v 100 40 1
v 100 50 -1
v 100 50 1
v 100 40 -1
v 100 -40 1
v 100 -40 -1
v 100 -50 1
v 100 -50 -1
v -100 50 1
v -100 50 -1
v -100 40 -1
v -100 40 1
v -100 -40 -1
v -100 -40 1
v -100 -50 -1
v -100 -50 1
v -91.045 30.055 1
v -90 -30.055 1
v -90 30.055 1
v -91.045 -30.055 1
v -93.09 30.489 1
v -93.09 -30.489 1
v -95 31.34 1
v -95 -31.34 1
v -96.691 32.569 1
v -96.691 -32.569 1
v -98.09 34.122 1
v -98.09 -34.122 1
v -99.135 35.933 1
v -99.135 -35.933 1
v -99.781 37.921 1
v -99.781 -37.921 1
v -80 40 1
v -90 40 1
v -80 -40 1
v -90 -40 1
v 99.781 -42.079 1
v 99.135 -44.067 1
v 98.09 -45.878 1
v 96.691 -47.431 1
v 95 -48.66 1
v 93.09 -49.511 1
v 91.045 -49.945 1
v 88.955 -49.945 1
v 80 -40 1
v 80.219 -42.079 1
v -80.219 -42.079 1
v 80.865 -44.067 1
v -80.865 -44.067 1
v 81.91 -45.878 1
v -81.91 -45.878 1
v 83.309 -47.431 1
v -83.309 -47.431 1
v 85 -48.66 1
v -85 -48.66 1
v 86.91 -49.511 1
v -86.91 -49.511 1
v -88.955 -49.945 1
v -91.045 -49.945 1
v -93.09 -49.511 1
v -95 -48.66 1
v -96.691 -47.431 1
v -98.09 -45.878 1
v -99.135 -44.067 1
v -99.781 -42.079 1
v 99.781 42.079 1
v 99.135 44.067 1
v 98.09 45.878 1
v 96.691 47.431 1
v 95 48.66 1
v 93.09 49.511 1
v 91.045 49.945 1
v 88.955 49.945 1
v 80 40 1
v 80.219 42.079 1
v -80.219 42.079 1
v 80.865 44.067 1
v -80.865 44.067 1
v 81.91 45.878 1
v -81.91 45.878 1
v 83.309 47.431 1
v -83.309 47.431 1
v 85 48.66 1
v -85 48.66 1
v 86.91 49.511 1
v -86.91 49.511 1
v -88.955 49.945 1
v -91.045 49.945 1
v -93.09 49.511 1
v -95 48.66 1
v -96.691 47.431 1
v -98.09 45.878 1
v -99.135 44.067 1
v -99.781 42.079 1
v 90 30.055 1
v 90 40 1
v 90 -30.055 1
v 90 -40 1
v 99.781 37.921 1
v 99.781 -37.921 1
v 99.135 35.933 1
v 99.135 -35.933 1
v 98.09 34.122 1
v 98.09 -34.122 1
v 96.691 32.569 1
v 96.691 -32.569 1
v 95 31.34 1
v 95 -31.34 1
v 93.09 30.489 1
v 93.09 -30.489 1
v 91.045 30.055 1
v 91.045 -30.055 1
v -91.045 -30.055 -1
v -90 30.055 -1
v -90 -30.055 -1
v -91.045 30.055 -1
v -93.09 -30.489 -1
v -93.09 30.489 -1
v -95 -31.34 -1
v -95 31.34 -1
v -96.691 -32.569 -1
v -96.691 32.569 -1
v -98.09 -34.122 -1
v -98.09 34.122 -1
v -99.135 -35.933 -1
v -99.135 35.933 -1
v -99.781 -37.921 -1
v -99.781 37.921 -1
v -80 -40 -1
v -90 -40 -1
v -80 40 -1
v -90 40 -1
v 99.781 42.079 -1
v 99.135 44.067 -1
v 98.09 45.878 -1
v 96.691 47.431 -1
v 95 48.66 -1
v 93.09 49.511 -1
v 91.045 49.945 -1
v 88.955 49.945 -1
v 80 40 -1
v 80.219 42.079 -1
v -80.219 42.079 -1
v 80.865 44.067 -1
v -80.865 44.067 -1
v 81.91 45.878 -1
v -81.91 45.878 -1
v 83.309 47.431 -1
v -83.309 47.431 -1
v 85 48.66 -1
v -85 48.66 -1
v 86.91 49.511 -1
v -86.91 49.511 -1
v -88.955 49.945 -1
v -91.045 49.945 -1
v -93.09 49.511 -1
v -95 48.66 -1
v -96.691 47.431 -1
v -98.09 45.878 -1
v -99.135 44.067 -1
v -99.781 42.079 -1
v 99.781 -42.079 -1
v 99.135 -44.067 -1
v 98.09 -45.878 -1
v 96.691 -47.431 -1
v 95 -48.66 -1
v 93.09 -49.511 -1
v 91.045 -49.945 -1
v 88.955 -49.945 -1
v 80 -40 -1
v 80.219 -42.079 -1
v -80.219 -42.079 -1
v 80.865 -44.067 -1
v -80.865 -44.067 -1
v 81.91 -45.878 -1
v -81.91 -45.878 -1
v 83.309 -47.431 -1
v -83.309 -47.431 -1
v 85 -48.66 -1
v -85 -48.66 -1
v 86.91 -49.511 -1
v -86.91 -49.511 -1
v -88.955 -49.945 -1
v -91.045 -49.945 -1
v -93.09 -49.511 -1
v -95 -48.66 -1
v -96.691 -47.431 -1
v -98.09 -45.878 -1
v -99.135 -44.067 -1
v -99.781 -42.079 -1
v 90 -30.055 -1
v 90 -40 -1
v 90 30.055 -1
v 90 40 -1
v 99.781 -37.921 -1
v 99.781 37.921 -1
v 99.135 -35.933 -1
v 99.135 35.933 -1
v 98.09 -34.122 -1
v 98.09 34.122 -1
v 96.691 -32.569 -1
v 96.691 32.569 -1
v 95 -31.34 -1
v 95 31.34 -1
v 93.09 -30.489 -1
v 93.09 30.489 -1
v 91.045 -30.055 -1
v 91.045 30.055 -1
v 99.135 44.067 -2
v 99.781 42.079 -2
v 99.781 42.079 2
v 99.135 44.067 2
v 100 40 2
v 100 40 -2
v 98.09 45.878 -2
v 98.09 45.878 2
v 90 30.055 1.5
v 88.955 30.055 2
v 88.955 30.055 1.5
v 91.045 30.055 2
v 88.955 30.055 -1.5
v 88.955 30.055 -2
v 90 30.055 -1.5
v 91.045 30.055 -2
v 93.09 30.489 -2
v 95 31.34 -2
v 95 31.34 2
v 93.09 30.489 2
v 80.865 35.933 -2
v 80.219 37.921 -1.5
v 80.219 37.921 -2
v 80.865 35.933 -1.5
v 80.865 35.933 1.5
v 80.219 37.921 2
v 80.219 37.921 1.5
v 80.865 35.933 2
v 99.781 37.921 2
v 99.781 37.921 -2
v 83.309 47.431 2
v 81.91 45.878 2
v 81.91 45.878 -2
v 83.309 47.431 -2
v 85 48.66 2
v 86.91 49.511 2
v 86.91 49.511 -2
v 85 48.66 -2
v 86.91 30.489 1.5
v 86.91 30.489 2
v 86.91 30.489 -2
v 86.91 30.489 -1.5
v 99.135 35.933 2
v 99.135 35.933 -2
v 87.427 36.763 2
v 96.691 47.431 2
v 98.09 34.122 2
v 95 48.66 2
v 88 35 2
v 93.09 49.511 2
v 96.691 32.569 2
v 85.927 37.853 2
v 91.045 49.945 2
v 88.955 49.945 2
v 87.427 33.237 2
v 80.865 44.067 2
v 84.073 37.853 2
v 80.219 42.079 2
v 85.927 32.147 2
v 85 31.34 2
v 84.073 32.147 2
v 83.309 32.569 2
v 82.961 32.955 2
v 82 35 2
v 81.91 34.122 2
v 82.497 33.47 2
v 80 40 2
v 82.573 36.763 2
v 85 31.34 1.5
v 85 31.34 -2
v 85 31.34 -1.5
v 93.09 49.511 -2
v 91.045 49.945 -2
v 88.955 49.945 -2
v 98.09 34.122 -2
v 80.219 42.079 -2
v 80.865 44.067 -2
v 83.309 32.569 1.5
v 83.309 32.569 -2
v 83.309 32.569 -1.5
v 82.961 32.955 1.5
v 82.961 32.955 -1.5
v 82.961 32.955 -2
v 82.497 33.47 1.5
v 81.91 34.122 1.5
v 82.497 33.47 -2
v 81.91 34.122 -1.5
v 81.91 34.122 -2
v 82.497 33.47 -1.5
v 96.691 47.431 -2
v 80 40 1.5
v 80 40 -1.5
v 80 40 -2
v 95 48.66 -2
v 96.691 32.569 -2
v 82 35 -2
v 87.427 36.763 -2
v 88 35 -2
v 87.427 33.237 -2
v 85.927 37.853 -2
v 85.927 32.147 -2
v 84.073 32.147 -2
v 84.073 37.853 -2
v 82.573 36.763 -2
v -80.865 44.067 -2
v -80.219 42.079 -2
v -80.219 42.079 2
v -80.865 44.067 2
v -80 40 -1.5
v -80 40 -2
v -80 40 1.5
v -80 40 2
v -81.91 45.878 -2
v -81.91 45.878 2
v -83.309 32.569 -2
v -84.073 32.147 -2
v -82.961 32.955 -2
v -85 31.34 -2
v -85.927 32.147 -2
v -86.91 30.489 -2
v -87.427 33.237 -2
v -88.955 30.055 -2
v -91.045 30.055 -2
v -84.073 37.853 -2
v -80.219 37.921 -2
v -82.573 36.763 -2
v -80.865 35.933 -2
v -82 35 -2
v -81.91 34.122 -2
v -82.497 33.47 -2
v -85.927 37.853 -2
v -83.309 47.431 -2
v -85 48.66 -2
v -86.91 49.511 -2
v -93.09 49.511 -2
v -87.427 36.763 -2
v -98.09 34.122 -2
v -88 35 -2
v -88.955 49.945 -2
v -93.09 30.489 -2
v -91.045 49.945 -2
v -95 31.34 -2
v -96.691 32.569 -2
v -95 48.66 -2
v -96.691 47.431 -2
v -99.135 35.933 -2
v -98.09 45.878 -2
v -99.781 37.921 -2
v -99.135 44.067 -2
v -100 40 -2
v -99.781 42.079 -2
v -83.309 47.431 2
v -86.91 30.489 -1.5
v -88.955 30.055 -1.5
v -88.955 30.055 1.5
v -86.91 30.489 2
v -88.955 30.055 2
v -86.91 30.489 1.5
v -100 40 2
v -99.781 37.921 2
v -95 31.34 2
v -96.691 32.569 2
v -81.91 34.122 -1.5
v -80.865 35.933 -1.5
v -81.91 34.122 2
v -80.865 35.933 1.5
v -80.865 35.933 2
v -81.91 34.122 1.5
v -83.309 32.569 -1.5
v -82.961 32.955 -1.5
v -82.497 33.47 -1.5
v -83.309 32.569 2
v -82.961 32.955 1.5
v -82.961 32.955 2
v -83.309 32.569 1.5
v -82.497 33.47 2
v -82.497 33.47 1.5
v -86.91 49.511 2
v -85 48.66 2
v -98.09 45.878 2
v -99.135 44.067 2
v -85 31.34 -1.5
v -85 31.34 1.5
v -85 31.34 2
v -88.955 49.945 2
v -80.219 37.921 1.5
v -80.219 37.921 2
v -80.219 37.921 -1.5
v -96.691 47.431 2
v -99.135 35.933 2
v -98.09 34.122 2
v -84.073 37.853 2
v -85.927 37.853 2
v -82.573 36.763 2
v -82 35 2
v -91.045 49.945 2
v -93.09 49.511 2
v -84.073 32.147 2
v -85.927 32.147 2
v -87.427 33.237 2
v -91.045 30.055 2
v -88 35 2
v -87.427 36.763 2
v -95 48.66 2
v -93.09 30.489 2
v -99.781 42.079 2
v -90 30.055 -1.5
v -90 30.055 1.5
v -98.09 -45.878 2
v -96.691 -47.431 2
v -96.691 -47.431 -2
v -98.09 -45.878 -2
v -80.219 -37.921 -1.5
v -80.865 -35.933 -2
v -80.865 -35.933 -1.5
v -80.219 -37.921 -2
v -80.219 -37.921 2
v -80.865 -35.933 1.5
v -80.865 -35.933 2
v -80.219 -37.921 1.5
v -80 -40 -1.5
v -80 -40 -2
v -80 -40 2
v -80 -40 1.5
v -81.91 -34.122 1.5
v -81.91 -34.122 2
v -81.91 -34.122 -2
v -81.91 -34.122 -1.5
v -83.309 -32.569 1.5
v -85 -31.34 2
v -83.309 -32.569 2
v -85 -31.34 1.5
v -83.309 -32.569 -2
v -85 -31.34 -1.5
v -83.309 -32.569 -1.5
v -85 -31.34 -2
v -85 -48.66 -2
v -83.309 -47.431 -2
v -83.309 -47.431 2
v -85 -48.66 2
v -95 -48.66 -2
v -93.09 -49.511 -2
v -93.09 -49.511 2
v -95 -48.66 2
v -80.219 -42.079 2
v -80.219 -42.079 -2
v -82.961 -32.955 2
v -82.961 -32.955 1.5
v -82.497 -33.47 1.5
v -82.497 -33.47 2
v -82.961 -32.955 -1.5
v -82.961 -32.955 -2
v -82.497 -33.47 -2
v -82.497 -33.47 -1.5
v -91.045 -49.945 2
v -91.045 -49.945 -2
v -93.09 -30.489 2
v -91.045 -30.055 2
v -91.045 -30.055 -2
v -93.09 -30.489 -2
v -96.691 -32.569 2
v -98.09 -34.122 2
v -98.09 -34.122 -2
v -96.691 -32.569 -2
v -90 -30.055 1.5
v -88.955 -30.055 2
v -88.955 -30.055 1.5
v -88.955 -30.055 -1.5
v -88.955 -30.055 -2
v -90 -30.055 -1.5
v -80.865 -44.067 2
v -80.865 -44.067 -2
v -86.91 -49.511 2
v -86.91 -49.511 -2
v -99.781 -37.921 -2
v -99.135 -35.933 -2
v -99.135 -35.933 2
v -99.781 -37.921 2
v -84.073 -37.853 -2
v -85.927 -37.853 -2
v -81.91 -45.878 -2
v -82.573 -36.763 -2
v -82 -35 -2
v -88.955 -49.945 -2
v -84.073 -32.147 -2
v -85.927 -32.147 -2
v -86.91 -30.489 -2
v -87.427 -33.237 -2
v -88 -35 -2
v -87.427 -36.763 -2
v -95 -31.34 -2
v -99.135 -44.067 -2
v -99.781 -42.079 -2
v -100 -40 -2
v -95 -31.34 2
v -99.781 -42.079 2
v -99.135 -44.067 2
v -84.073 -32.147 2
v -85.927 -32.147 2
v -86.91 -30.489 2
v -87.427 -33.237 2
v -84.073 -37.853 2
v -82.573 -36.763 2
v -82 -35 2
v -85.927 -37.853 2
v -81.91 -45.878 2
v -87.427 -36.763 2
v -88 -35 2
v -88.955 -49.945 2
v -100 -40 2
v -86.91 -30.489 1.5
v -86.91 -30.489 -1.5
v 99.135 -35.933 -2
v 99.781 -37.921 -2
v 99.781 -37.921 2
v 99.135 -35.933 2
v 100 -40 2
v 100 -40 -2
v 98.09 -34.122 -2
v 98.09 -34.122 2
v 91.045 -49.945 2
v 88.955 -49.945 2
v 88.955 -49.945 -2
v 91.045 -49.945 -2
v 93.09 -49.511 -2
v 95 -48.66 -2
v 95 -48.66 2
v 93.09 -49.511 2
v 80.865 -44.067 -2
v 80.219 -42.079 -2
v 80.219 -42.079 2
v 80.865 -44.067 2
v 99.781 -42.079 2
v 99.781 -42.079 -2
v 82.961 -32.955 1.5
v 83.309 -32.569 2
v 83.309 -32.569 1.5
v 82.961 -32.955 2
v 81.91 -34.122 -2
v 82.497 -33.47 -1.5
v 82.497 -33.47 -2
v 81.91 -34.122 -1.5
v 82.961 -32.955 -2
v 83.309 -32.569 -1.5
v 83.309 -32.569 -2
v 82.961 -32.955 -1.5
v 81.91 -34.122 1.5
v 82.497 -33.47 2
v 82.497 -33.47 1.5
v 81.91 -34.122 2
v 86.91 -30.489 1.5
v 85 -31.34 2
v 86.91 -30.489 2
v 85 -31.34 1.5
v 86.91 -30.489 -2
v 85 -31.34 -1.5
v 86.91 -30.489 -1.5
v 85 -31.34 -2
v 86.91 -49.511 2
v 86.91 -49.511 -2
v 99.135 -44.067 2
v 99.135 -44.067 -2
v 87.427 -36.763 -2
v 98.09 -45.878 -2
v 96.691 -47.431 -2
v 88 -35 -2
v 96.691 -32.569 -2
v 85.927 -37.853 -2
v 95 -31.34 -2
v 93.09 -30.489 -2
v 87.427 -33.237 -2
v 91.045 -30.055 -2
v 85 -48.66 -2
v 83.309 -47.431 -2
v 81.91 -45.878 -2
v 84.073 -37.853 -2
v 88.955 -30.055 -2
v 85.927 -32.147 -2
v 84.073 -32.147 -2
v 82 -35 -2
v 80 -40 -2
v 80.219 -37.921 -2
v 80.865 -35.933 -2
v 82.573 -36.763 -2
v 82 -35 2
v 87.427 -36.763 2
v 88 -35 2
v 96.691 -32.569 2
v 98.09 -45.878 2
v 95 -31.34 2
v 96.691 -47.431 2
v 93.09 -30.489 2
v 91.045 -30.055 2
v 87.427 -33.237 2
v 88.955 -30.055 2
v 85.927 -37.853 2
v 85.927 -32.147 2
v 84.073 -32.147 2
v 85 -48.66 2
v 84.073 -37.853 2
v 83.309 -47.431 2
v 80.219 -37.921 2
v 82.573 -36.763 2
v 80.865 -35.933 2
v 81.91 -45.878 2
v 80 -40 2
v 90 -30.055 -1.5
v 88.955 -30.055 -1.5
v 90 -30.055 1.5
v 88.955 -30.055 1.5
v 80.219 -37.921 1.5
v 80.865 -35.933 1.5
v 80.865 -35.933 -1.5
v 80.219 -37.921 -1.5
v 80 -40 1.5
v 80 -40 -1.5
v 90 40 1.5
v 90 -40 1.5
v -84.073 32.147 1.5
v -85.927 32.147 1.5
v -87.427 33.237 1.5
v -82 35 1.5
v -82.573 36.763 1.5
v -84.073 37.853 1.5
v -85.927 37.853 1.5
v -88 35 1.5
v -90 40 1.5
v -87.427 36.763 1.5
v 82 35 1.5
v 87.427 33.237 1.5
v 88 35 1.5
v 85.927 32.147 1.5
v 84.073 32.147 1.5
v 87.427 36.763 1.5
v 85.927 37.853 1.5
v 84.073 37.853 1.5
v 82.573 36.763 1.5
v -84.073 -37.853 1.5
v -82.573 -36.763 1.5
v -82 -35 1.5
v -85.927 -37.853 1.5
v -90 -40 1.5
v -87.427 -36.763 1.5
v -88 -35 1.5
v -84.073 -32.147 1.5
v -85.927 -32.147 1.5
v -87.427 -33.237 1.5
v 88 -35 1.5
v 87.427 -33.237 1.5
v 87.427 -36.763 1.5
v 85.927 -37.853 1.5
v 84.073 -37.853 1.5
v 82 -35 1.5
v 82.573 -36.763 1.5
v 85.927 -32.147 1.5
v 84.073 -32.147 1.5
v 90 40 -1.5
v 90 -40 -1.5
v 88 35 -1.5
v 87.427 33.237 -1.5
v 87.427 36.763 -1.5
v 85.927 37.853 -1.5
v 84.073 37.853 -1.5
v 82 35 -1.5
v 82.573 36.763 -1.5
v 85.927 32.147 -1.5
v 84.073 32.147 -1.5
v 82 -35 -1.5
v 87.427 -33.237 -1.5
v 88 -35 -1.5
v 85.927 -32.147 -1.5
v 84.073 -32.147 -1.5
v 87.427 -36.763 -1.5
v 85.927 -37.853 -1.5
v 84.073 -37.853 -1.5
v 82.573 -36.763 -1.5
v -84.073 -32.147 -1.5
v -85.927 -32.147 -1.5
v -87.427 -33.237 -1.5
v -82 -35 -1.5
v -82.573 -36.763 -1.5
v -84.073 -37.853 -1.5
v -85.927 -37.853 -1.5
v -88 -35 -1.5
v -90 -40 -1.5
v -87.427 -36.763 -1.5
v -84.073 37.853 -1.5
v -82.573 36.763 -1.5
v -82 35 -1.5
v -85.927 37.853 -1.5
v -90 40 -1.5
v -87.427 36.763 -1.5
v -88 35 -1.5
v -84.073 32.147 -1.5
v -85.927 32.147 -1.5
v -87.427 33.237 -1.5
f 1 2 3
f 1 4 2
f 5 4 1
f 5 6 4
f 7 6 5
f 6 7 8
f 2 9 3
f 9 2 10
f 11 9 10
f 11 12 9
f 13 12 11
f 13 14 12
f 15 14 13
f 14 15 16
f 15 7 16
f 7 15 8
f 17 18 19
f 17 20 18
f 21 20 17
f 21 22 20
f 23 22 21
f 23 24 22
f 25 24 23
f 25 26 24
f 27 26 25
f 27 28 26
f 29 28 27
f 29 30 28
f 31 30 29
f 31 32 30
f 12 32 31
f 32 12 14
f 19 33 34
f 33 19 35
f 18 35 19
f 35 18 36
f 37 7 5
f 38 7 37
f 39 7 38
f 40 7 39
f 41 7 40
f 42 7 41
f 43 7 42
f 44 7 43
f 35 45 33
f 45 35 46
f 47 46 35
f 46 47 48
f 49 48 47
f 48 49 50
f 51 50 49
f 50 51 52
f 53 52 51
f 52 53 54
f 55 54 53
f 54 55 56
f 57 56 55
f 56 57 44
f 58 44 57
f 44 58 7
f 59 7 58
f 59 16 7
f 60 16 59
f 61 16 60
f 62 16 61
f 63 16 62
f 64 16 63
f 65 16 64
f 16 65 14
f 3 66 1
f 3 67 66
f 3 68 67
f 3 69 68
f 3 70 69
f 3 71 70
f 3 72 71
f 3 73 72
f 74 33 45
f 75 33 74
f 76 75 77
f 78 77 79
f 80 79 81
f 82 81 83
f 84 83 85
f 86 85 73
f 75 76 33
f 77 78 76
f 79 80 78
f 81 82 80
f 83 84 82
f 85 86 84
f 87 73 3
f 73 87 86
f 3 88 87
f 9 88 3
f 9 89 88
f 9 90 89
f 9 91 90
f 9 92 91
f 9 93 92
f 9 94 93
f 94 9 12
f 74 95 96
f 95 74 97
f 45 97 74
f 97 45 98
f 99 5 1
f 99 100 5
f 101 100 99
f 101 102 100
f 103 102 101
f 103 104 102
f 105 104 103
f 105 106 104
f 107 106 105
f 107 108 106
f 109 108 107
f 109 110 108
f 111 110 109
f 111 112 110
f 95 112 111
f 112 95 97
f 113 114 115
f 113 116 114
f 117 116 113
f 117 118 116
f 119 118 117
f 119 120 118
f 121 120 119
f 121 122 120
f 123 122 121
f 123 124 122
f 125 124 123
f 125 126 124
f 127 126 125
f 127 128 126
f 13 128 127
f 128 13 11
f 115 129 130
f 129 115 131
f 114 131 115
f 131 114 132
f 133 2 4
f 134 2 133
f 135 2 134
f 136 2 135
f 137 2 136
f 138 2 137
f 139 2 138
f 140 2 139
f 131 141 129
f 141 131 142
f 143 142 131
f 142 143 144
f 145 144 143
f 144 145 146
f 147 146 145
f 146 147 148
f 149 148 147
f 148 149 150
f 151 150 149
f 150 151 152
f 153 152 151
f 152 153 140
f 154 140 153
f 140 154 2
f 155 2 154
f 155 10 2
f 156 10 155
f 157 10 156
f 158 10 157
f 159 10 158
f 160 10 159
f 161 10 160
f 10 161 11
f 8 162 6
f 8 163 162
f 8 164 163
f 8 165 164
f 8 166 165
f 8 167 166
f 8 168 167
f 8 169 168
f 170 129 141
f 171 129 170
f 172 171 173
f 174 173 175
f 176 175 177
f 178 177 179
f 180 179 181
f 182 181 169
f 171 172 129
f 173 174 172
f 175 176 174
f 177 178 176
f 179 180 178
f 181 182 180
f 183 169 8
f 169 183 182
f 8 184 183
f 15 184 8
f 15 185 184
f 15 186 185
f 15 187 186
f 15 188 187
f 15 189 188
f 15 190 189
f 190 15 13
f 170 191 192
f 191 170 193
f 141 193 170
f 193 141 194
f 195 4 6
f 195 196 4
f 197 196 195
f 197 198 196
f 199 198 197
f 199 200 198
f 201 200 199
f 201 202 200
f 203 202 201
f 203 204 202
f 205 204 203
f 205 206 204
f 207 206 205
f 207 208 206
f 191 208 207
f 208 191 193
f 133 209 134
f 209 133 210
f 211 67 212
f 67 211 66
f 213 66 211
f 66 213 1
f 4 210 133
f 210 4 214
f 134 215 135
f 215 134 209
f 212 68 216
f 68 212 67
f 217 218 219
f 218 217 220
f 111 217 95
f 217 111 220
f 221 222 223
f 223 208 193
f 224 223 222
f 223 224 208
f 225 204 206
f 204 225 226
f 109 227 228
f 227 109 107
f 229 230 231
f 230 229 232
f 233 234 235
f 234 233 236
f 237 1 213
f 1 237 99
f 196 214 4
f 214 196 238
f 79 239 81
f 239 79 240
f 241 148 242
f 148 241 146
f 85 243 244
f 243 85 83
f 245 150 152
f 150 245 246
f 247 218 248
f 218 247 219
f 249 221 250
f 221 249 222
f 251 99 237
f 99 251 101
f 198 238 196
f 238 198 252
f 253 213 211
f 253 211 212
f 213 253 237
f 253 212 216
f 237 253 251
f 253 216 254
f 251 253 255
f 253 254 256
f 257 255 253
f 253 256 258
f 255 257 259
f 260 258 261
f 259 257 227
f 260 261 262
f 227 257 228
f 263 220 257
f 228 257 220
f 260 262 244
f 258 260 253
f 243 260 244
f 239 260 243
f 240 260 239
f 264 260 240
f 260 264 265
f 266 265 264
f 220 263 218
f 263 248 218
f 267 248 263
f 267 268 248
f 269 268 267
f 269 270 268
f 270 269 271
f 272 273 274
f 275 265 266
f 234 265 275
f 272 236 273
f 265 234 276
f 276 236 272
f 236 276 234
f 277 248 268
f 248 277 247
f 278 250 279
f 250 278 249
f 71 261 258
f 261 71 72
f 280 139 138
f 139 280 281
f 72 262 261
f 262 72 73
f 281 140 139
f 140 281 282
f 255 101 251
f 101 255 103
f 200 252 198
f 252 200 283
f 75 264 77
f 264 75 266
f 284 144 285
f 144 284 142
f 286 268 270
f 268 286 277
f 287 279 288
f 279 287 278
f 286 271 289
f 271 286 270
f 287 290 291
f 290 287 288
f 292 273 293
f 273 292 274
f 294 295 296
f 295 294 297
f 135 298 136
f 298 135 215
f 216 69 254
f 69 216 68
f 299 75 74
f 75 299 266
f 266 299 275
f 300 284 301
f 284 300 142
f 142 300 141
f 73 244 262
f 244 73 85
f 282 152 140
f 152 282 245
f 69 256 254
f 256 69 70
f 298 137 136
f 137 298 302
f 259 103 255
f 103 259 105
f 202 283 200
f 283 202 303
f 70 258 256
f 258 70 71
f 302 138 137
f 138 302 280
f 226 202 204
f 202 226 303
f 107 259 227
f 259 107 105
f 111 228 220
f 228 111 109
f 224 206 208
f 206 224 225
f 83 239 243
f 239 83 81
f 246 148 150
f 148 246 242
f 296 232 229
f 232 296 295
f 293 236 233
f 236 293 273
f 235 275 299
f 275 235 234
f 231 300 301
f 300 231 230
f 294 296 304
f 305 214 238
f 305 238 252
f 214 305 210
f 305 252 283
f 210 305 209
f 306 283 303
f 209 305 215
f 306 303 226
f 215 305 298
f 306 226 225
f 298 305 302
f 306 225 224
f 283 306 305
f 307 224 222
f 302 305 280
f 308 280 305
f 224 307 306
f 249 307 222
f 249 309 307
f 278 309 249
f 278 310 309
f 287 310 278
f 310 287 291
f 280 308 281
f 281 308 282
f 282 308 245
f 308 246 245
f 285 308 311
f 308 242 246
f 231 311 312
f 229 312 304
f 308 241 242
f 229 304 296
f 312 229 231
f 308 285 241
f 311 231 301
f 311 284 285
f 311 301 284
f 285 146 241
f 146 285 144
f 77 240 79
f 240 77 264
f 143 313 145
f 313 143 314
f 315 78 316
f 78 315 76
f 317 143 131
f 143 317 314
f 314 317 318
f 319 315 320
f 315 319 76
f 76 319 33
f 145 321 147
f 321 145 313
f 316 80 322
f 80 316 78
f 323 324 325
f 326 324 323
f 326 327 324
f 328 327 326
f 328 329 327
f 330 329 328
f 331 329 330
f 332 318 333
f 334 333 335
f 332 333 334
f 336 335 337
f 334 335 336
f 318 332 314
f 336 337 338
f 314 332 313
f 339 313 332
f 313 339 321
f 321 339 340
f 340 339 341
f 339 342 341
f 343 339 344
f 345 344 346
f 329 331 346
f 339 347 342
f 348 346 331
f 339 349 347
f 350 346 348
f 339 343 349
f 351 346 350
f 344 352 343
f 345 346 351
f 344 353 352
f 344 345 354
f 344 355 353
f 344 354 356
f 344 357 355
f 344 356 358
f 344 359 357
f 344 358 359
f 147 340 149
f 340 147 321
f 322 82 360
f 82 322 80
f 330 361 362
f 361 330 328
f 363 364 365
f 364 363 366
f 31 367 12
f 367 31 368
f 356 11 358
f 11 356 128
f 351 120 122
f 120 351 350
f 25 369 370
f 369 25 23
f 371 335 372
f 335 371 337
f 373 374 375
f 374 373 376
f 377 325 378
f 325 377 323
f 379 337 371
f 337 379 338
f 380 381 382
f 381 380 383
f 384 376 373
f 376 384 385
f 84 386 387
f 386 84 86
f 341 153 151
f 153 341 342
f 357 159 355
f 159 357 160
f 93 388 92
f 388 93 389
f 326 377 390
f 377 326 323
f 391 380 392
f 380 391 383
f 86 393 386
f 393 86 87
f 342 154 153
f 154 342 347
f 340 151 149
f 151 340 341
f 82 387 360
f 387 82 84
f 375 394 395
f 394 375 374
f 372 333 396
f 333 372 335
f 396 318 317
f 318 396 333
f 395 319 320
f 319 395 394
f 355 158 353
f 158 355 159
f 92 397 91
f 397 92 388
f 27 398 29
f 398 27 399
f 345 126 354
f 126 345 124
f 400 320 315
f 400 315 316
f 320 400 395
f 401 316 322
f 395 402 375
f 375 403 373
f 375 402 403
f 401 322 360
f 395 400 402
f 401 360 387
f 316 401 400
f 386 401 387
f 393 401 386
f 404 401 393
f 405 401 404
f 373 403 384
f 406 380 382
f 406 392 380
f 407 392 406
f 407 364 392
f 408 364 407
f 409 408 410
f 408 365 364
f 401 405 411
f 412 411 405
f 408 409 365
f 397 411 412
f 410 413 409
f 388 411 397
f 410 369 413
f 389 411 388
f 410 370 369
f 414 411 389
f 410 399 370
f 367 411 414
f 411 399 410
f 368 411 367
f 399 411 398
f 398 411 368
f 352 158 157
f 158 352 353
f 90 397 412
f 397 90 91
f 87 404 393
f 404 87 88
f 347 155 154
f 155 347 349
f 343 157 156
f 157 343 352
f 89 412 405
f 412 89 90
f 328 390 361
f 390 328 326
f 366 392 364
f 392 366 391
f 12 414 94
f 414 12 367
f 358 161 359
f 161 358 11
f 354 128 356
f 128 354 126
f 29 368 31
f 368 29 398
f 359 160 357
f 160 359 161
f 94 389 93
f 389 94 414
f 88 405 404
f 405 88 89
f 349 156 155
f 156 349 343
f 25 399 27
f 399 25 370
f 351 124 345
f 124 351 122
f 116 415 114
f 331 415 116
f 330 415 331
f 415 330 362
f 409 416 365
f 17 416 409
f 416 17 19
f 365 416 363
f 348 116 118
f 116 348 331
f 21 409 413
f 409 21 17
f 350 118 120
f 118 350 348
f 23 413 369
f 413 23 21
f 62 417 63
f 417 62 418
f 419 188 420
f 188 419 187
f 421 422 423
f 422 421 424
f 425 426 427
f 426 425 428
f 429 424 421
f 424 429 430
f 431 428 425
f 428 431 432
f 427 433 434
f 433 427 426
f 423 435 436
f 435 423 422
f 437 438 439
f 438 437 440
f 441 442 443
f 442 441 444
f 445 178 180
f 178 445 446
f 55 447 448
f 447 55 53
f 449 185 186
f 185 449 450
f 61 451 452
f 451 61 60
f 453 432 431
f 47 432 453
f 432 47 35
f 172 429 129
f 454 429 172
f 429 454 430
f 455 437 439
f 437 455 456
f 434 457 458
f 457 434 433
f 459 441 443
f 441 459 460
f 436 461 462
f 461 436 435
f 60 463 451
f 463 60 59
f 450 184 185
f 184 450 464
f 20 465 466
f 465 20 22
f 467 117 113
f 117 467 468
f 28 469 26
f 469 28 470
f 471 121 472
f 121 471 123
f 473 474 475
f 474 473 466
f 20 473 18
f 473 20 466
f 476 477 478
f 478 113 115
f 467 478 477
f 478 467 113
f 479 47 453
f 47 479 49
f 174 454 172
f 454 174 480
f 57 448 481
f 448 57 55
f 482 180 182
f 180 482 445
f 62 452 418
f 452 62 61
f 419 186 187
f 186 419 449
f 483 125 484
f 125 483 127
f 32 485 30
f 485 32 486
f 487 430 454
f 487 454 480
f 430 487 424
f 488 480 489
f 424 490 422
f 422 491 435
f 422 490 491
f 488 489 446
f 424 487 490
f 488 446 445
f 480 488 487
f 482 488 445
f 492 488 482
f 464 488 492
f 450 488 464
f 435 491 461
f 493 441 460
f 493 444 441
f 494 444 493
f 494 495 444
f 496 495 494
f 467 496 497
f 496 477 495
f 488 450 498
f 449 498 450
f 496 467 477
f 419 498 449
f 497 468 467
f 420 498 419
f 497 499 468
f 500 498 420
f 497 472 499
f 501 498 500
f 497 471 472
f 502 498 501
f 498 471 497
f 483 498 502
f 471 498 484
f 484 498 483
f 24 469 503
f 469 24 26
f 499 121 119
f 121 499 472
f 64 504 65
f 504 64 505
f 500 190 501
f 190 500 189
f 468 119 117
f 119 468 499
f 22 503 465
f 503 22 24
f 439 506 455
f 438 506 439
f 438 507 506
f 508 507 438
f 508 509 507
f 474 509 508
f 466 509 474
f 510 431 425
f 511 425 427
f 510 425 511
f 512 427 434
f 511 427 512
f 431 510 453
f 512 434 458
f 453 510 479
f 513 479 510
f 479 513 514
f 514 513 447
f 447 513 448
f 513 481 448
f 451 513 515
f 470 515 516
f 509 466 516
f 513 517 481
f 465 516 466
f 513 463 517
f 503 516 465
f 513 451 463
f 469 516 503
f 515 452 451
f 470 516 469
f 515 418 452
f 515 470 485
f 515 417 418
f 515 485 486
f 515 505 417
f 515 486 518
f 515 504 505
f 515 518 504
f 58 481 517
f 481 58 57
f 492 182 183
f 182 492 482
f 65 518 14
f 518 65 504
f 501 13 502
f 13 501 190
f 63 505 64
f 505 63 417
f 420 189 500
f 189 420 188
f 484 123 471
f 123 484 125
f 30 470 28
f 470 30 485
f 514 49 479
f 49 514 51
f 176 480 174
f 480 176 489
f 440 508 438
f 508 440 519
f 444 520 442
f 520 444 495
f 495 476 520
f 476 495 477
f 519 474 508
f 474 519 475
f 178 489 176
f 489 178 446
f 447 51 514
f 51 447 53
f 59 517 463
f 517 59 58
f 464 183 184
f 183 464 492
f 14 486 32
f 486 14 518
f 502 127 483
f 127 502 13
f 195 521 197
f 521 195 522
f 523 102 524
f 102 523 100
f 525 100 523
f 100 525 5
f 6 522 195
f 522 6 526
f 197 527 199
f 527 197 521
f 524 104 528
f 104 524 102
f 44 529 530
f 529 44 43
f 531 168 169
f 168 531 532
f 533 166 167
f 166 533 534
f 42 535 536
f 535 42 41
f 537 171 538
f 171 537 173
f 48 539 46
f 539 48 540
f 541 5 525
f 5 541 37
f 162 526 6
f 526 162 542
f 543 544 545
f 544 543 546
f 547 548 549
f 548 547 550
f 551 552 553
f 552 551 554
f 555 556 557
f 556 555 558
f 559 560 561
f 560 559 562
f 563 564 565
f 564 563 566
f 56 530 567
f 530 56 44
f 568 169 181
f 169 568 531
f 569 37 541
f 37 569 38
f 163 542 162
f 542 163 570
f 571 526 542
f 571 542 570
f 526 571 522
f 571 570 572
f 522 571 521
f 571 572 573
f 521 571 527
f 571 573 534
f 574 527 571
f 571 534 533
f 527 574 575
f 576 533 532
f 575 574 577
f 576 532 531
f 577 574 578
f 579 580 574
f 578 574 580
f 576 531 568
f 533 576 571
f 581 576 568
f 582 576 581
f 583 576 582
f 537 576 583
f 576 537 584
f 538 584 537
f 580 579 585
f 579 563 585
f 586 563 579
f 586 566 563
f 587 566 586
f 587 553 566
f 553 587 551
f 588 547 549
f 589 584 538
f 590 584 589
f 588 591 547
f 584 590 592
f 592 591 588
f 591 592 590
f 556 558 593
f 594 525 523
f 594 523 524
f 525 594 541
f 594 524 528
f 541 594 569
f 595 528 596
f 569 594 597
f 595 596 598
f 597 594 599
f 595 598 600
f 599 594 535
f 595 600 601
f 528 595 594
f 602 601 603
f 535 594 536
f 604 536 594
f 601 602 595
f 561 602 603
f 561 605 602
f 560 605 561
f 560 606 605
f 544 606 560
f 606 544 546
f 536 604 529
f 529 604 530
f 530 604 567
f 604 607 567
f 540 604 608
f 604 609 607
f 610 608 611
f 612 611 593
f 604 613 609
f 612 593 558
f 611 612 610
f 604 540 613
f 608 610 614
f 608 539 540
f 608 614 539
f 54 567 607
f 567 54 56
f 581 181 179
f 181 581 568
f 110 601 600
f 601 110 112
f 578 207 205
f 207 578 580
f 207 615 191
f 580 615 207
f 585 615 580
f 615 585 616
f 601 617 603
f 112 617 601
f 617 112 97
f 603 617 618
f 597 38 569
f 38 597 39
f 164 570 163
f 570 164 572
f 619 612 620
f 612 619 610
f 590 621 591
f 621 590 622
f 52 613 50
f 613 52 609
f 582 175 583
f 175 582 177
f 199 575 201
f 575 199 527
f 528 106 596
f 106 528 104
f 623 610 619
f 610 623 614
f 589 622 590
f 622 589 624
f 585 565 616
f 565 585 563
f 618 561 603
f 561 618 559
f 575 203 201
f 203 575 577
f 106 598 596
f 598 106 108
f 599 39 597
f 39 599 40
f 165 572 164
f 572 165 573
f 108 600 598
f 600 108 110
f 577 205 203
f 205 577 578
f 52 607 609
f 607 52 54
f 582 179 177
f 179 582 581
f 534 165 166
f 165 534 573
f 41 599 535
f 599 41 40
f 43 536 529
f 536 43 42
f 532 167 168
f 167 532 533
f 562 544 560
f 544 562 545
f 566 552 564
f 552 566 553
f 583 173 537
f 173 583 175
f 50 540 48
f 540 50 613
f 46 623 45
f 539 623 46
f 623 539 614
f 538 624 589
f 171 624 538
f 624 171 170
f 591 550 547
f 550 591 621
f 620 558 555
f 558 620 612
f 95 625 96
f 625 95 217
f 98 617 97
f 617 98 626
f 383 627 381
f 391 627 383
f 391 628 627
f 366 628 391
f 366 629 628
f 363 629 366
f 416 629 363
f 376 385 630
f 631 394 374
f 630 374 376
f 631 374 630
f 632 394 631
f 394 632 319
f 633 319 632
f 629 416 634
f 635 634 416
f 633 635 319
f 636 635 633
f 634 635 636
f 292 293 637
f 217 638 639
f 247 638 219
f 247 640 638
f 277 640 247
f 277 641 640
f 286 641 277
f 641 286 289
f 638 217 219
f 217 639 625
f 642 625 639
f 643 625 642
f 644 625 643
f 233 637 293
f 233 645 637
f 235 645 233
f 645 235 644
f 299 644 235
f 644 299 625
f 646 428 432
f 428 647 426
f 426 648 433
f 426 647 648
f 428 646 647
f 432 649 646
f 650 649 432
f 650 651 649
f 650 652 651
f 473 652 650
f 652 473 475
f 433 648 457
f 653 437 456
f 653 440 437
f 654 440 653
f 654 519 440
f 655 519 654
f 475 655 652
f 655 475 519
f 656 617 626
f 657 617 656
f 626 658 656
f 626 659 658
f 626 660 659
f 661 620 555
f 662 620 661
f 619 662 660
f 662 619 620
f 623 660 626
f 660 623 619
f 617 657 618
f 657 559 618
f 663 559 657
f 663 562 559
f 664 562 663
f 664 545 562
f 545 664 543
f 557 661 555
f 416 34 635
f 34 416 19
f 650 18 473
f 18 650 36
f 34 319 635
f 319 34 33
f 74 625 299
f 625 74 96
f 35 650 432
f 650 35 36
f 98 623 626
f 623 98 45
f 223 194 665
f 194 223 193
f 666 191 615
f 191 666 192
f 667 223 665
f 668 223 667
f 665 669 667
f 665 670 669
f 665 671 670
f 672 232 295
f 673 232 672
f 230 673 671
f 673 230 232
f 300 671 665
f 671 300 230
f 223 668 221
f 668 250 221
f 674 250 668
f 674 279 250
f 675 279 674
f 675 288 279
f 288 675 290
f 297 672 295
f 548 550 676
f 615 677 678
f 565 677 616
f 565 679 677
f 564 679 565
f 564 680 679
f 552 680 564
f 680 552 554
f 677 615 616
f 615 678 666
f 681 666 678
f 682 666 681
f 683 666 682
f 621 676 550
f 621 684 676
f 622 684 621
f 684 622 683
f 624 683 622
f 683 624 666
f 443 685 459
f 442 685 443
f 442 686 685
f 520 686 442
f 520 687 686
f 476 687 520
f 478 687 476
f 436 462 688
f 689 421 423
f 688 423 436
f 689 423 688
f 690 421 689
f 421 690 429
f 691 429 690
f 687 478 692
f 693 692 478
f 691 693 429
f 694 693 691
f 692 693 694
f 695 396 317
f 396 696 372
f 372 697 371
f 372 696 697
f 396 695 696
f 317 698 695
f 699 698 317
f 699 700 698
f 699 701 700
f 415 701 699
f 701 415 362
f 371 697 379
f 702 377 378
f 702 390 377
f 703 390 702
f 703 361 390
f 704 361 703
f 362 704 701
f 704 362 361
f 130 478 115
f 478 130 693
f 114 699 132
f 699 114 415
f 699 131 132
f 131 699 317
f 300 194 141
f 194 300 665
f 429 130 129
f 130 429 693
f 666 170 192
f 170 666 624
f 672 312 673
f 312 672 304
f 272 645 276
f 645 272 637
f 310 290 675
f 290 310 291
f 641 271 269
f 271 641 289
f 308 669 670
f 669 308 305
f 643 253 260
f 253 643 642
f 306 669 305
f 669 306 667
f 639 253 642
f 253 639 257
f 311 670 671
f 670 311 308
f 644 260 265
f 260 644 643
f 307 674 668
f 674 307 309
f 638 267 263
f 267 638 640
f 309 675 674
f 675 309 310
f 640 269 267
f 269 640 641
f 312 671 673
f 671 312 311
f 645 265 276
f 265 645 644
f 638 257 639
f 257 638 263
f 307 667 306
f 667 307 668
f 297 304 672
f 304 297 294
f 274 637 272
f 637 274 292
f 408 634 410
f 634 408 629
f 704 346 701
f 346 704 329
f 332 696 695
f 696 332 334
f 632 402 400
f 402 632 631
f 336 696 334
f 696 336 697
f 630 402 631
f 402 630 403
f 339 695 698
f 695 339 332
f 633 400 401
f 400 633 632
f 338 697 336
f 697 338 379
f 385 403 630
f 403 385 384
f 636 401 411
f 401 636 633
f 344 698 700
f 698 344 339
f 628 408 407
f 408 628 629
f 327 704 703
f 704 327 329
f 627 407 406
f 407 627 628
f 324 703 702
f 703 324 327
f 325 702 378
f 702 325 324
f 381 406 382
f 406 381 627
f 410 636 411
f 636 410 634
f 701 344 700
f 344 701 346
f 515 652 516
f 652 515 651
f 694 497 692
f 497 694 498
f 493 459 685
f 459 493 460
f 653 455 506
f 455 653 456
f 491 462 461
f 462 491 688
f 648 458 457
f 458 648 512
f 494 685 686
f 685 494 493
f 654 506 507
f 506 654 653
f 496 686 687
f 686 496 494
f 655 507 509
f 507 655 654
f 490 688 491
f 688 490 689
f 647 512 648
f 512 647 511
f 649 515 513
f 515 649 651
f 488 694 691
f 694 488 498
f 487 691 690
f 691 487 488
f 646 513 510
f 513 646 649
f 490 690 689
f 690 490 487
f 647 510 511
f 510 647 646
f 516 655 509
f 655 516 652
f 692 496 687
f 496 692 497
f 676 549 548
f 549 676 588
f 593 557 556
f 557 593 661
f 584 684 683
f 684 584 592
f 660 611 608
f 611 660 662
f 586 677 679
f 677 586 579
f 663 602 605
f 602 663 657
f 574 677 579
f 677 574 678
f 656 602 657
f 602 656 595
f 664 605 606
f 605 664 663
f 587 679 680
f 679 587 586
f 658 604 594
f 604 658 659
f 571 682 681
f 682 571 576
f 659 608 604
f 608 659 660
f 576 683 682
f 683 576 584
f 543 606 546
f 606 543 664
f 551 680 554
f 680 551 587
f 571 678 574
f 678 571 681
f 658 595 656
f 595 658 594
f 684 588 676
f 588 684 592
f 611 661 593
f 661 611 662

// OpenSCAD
// Parameters
sheet_L = 200; //[100:400:1]
sheet_W = 100; //[50:200:1]
sheet_T = 2; //[1:6:0.5]
corner_R = 10; //[5:20:1]
chamfer_C = 1; //[0.5:3:0.5]
hole_d = 6; //[3:12:0.5]
hole_edge_offset = 15; //[8:30:1]
hole_clearance_z = 2; //[1:6:0.5]
overlap = 1; //[0.5:2:0.5]

// Base Shapes
module sheet_body() {
  translate([0, 0, 0])
    cube([sheet_L, sheet_W, sheet_T], center=true);
}

module corner_rounds() {
  translate([sheet_L/2 - corner_R, sheet_W/2 - corner_R, 0])
    cylinder(r=corner_R, h=sheet_T + 2*overlap, center=true);
}

module corner_rounds_2() {
  translate([-sheet_L/2 + corner_R, sheet_W/2 - corner_R, 0])
    cylinder(r=corner_R, h=sheet_T + 2*overlap, center=true);
}

module corner_rounds_3() {
  translate([-sheet_L/2 + corner_R, -sheet_W/2 + corner_R, 0])
    cylinder(r=corner_R, h=sheet_T + 2*overlap, center=true);
}

module corner_rounds_4() {
  translate([sheet_L/2 - corner_R, -sheet_W/2 + corner_R, 0])
    cylinder(r=corner_R, h=sheet_T + 2*overlap, center=true);
}

module corner_cut_1() {
  translate([sheet_L/2 - corner_R/2, sheet_W/2 - corner_R/2, 0])
    cube([corner_R, corner_R, sheet_T + 2*overlap], center=true);
}

module corner_cut_2() {
  translate([-sheet_L/2 + corner_R/2, sheet_W/2 - corner_R/2, 0])
    cube([corner_R, corner_R, sheet_T + 2*overlap], center=true);
}

module corner_cut_3() {
  translate([-sheet_L/2 + corner_R/2, -sheet_W/2 + corner_R/2, 0])
    cube([corner_R, corner_R, sheet_T + 2*overlap], center=true);
}

module corner_cut_4() {
  translate([sheet_L/2 - corner_R/2, -sheet_W/2 + corner_R/2, 0])
    cube([corner_R, corner_R, sheet_T + 2*overlap], center=true);
}

module edge_chamfer() {
  translate([0, 0, sheet_T/2 - chamfer_C/2 + overlap/2])
    cube([sheet_L - 2*corner_R, sheet_W - 2*corner_R, chamfer_C], center=true);
}

module edge_chamfer_2() {
  translate([0, 0, -sheet_T/2 + chamfer_C/2 - overlap/2])
    cube([sheet_L - 2*corner_R, sheet_W - 2*corner_R, chamfer_C], center=true);
}

module mounting_holes() {
  translate([sheet_L/2 - hole_edge_offset, sheet_W/2 - hole_edge_offset, 0])
    cylinder(r=hole_d/2, h=sheet_T + hole_clearance_z, center=true);
}

module mounting_holes_2() {
  translate([-sheet_L/2 + hole_edge_offset, sheet_W/2 - hole_edge_offset, 0])
    cylinder(r=hole_d/2, h=sheet_T + hole_clearance_z, center=true);
}

module mounting_holes_3() {
  translate([-sheet_L/2 + hole_edge_offset, -sheet_W/2 + hole_edge_offset, 0])
    cylinder(r=hole_d/2, h=sheet_T + hole_clearance_z, center=true);
}

module mounting_holes_4() {
  translate([sheet_L/2 - hole_edge_offset, -sheet_W/2 + hole_edge_offset, 0])
    cylinder(r=hole_d/2, h=sheet_T + hole_clearance_z, center=true);
}

module material_tag() {
  translate([0, 0, 0])
    cube([sheet_L, sheet_W, sheet_T], center=true);
}

// Operations
module rounded_corners_union() {
  union() {
    corner_rounds();
    corner_rounds_2();
    corner_rounds_3();
    corner_rounds_4();
  }
}

module corner_cuts_union() {
  union() {
    corner_cut_1();
    corner_cut_2();
    corner_cut_3();
    corner_cut_4();
  }
}

module rounded_sheet_pre() {
  difference() {
    sheet_body();
    corner_cuts_union();
  }
}

module rounded_sheet() {
  union() {
    rounded_sheet_pre();
    rounded_corners_union();
  }
}

module edge_chamfer_union() {
  union() {
    edge_chamfer();
    edge_chamfer_2();
  }
}

module mounting_holes_union() {
  union() {
    mounting_holes();
    mounting_holes_2();
    mounting_holes_3();
    mounting_holes_4();
  }
}

module sheet_with_chamfer() {
  difference() {
    rounded_sheet();
    edge_chamfer_union();
  }
}

module sheet_with_holes() {
  difference() {
    sheet_with_chamfer();
    mounting_holes_union();
  }
}

module complete_model() {
  union() {
    sheet_with_holes();
    material_tag();
  }
}

// Final Output
color("DimGray") complete_model();
